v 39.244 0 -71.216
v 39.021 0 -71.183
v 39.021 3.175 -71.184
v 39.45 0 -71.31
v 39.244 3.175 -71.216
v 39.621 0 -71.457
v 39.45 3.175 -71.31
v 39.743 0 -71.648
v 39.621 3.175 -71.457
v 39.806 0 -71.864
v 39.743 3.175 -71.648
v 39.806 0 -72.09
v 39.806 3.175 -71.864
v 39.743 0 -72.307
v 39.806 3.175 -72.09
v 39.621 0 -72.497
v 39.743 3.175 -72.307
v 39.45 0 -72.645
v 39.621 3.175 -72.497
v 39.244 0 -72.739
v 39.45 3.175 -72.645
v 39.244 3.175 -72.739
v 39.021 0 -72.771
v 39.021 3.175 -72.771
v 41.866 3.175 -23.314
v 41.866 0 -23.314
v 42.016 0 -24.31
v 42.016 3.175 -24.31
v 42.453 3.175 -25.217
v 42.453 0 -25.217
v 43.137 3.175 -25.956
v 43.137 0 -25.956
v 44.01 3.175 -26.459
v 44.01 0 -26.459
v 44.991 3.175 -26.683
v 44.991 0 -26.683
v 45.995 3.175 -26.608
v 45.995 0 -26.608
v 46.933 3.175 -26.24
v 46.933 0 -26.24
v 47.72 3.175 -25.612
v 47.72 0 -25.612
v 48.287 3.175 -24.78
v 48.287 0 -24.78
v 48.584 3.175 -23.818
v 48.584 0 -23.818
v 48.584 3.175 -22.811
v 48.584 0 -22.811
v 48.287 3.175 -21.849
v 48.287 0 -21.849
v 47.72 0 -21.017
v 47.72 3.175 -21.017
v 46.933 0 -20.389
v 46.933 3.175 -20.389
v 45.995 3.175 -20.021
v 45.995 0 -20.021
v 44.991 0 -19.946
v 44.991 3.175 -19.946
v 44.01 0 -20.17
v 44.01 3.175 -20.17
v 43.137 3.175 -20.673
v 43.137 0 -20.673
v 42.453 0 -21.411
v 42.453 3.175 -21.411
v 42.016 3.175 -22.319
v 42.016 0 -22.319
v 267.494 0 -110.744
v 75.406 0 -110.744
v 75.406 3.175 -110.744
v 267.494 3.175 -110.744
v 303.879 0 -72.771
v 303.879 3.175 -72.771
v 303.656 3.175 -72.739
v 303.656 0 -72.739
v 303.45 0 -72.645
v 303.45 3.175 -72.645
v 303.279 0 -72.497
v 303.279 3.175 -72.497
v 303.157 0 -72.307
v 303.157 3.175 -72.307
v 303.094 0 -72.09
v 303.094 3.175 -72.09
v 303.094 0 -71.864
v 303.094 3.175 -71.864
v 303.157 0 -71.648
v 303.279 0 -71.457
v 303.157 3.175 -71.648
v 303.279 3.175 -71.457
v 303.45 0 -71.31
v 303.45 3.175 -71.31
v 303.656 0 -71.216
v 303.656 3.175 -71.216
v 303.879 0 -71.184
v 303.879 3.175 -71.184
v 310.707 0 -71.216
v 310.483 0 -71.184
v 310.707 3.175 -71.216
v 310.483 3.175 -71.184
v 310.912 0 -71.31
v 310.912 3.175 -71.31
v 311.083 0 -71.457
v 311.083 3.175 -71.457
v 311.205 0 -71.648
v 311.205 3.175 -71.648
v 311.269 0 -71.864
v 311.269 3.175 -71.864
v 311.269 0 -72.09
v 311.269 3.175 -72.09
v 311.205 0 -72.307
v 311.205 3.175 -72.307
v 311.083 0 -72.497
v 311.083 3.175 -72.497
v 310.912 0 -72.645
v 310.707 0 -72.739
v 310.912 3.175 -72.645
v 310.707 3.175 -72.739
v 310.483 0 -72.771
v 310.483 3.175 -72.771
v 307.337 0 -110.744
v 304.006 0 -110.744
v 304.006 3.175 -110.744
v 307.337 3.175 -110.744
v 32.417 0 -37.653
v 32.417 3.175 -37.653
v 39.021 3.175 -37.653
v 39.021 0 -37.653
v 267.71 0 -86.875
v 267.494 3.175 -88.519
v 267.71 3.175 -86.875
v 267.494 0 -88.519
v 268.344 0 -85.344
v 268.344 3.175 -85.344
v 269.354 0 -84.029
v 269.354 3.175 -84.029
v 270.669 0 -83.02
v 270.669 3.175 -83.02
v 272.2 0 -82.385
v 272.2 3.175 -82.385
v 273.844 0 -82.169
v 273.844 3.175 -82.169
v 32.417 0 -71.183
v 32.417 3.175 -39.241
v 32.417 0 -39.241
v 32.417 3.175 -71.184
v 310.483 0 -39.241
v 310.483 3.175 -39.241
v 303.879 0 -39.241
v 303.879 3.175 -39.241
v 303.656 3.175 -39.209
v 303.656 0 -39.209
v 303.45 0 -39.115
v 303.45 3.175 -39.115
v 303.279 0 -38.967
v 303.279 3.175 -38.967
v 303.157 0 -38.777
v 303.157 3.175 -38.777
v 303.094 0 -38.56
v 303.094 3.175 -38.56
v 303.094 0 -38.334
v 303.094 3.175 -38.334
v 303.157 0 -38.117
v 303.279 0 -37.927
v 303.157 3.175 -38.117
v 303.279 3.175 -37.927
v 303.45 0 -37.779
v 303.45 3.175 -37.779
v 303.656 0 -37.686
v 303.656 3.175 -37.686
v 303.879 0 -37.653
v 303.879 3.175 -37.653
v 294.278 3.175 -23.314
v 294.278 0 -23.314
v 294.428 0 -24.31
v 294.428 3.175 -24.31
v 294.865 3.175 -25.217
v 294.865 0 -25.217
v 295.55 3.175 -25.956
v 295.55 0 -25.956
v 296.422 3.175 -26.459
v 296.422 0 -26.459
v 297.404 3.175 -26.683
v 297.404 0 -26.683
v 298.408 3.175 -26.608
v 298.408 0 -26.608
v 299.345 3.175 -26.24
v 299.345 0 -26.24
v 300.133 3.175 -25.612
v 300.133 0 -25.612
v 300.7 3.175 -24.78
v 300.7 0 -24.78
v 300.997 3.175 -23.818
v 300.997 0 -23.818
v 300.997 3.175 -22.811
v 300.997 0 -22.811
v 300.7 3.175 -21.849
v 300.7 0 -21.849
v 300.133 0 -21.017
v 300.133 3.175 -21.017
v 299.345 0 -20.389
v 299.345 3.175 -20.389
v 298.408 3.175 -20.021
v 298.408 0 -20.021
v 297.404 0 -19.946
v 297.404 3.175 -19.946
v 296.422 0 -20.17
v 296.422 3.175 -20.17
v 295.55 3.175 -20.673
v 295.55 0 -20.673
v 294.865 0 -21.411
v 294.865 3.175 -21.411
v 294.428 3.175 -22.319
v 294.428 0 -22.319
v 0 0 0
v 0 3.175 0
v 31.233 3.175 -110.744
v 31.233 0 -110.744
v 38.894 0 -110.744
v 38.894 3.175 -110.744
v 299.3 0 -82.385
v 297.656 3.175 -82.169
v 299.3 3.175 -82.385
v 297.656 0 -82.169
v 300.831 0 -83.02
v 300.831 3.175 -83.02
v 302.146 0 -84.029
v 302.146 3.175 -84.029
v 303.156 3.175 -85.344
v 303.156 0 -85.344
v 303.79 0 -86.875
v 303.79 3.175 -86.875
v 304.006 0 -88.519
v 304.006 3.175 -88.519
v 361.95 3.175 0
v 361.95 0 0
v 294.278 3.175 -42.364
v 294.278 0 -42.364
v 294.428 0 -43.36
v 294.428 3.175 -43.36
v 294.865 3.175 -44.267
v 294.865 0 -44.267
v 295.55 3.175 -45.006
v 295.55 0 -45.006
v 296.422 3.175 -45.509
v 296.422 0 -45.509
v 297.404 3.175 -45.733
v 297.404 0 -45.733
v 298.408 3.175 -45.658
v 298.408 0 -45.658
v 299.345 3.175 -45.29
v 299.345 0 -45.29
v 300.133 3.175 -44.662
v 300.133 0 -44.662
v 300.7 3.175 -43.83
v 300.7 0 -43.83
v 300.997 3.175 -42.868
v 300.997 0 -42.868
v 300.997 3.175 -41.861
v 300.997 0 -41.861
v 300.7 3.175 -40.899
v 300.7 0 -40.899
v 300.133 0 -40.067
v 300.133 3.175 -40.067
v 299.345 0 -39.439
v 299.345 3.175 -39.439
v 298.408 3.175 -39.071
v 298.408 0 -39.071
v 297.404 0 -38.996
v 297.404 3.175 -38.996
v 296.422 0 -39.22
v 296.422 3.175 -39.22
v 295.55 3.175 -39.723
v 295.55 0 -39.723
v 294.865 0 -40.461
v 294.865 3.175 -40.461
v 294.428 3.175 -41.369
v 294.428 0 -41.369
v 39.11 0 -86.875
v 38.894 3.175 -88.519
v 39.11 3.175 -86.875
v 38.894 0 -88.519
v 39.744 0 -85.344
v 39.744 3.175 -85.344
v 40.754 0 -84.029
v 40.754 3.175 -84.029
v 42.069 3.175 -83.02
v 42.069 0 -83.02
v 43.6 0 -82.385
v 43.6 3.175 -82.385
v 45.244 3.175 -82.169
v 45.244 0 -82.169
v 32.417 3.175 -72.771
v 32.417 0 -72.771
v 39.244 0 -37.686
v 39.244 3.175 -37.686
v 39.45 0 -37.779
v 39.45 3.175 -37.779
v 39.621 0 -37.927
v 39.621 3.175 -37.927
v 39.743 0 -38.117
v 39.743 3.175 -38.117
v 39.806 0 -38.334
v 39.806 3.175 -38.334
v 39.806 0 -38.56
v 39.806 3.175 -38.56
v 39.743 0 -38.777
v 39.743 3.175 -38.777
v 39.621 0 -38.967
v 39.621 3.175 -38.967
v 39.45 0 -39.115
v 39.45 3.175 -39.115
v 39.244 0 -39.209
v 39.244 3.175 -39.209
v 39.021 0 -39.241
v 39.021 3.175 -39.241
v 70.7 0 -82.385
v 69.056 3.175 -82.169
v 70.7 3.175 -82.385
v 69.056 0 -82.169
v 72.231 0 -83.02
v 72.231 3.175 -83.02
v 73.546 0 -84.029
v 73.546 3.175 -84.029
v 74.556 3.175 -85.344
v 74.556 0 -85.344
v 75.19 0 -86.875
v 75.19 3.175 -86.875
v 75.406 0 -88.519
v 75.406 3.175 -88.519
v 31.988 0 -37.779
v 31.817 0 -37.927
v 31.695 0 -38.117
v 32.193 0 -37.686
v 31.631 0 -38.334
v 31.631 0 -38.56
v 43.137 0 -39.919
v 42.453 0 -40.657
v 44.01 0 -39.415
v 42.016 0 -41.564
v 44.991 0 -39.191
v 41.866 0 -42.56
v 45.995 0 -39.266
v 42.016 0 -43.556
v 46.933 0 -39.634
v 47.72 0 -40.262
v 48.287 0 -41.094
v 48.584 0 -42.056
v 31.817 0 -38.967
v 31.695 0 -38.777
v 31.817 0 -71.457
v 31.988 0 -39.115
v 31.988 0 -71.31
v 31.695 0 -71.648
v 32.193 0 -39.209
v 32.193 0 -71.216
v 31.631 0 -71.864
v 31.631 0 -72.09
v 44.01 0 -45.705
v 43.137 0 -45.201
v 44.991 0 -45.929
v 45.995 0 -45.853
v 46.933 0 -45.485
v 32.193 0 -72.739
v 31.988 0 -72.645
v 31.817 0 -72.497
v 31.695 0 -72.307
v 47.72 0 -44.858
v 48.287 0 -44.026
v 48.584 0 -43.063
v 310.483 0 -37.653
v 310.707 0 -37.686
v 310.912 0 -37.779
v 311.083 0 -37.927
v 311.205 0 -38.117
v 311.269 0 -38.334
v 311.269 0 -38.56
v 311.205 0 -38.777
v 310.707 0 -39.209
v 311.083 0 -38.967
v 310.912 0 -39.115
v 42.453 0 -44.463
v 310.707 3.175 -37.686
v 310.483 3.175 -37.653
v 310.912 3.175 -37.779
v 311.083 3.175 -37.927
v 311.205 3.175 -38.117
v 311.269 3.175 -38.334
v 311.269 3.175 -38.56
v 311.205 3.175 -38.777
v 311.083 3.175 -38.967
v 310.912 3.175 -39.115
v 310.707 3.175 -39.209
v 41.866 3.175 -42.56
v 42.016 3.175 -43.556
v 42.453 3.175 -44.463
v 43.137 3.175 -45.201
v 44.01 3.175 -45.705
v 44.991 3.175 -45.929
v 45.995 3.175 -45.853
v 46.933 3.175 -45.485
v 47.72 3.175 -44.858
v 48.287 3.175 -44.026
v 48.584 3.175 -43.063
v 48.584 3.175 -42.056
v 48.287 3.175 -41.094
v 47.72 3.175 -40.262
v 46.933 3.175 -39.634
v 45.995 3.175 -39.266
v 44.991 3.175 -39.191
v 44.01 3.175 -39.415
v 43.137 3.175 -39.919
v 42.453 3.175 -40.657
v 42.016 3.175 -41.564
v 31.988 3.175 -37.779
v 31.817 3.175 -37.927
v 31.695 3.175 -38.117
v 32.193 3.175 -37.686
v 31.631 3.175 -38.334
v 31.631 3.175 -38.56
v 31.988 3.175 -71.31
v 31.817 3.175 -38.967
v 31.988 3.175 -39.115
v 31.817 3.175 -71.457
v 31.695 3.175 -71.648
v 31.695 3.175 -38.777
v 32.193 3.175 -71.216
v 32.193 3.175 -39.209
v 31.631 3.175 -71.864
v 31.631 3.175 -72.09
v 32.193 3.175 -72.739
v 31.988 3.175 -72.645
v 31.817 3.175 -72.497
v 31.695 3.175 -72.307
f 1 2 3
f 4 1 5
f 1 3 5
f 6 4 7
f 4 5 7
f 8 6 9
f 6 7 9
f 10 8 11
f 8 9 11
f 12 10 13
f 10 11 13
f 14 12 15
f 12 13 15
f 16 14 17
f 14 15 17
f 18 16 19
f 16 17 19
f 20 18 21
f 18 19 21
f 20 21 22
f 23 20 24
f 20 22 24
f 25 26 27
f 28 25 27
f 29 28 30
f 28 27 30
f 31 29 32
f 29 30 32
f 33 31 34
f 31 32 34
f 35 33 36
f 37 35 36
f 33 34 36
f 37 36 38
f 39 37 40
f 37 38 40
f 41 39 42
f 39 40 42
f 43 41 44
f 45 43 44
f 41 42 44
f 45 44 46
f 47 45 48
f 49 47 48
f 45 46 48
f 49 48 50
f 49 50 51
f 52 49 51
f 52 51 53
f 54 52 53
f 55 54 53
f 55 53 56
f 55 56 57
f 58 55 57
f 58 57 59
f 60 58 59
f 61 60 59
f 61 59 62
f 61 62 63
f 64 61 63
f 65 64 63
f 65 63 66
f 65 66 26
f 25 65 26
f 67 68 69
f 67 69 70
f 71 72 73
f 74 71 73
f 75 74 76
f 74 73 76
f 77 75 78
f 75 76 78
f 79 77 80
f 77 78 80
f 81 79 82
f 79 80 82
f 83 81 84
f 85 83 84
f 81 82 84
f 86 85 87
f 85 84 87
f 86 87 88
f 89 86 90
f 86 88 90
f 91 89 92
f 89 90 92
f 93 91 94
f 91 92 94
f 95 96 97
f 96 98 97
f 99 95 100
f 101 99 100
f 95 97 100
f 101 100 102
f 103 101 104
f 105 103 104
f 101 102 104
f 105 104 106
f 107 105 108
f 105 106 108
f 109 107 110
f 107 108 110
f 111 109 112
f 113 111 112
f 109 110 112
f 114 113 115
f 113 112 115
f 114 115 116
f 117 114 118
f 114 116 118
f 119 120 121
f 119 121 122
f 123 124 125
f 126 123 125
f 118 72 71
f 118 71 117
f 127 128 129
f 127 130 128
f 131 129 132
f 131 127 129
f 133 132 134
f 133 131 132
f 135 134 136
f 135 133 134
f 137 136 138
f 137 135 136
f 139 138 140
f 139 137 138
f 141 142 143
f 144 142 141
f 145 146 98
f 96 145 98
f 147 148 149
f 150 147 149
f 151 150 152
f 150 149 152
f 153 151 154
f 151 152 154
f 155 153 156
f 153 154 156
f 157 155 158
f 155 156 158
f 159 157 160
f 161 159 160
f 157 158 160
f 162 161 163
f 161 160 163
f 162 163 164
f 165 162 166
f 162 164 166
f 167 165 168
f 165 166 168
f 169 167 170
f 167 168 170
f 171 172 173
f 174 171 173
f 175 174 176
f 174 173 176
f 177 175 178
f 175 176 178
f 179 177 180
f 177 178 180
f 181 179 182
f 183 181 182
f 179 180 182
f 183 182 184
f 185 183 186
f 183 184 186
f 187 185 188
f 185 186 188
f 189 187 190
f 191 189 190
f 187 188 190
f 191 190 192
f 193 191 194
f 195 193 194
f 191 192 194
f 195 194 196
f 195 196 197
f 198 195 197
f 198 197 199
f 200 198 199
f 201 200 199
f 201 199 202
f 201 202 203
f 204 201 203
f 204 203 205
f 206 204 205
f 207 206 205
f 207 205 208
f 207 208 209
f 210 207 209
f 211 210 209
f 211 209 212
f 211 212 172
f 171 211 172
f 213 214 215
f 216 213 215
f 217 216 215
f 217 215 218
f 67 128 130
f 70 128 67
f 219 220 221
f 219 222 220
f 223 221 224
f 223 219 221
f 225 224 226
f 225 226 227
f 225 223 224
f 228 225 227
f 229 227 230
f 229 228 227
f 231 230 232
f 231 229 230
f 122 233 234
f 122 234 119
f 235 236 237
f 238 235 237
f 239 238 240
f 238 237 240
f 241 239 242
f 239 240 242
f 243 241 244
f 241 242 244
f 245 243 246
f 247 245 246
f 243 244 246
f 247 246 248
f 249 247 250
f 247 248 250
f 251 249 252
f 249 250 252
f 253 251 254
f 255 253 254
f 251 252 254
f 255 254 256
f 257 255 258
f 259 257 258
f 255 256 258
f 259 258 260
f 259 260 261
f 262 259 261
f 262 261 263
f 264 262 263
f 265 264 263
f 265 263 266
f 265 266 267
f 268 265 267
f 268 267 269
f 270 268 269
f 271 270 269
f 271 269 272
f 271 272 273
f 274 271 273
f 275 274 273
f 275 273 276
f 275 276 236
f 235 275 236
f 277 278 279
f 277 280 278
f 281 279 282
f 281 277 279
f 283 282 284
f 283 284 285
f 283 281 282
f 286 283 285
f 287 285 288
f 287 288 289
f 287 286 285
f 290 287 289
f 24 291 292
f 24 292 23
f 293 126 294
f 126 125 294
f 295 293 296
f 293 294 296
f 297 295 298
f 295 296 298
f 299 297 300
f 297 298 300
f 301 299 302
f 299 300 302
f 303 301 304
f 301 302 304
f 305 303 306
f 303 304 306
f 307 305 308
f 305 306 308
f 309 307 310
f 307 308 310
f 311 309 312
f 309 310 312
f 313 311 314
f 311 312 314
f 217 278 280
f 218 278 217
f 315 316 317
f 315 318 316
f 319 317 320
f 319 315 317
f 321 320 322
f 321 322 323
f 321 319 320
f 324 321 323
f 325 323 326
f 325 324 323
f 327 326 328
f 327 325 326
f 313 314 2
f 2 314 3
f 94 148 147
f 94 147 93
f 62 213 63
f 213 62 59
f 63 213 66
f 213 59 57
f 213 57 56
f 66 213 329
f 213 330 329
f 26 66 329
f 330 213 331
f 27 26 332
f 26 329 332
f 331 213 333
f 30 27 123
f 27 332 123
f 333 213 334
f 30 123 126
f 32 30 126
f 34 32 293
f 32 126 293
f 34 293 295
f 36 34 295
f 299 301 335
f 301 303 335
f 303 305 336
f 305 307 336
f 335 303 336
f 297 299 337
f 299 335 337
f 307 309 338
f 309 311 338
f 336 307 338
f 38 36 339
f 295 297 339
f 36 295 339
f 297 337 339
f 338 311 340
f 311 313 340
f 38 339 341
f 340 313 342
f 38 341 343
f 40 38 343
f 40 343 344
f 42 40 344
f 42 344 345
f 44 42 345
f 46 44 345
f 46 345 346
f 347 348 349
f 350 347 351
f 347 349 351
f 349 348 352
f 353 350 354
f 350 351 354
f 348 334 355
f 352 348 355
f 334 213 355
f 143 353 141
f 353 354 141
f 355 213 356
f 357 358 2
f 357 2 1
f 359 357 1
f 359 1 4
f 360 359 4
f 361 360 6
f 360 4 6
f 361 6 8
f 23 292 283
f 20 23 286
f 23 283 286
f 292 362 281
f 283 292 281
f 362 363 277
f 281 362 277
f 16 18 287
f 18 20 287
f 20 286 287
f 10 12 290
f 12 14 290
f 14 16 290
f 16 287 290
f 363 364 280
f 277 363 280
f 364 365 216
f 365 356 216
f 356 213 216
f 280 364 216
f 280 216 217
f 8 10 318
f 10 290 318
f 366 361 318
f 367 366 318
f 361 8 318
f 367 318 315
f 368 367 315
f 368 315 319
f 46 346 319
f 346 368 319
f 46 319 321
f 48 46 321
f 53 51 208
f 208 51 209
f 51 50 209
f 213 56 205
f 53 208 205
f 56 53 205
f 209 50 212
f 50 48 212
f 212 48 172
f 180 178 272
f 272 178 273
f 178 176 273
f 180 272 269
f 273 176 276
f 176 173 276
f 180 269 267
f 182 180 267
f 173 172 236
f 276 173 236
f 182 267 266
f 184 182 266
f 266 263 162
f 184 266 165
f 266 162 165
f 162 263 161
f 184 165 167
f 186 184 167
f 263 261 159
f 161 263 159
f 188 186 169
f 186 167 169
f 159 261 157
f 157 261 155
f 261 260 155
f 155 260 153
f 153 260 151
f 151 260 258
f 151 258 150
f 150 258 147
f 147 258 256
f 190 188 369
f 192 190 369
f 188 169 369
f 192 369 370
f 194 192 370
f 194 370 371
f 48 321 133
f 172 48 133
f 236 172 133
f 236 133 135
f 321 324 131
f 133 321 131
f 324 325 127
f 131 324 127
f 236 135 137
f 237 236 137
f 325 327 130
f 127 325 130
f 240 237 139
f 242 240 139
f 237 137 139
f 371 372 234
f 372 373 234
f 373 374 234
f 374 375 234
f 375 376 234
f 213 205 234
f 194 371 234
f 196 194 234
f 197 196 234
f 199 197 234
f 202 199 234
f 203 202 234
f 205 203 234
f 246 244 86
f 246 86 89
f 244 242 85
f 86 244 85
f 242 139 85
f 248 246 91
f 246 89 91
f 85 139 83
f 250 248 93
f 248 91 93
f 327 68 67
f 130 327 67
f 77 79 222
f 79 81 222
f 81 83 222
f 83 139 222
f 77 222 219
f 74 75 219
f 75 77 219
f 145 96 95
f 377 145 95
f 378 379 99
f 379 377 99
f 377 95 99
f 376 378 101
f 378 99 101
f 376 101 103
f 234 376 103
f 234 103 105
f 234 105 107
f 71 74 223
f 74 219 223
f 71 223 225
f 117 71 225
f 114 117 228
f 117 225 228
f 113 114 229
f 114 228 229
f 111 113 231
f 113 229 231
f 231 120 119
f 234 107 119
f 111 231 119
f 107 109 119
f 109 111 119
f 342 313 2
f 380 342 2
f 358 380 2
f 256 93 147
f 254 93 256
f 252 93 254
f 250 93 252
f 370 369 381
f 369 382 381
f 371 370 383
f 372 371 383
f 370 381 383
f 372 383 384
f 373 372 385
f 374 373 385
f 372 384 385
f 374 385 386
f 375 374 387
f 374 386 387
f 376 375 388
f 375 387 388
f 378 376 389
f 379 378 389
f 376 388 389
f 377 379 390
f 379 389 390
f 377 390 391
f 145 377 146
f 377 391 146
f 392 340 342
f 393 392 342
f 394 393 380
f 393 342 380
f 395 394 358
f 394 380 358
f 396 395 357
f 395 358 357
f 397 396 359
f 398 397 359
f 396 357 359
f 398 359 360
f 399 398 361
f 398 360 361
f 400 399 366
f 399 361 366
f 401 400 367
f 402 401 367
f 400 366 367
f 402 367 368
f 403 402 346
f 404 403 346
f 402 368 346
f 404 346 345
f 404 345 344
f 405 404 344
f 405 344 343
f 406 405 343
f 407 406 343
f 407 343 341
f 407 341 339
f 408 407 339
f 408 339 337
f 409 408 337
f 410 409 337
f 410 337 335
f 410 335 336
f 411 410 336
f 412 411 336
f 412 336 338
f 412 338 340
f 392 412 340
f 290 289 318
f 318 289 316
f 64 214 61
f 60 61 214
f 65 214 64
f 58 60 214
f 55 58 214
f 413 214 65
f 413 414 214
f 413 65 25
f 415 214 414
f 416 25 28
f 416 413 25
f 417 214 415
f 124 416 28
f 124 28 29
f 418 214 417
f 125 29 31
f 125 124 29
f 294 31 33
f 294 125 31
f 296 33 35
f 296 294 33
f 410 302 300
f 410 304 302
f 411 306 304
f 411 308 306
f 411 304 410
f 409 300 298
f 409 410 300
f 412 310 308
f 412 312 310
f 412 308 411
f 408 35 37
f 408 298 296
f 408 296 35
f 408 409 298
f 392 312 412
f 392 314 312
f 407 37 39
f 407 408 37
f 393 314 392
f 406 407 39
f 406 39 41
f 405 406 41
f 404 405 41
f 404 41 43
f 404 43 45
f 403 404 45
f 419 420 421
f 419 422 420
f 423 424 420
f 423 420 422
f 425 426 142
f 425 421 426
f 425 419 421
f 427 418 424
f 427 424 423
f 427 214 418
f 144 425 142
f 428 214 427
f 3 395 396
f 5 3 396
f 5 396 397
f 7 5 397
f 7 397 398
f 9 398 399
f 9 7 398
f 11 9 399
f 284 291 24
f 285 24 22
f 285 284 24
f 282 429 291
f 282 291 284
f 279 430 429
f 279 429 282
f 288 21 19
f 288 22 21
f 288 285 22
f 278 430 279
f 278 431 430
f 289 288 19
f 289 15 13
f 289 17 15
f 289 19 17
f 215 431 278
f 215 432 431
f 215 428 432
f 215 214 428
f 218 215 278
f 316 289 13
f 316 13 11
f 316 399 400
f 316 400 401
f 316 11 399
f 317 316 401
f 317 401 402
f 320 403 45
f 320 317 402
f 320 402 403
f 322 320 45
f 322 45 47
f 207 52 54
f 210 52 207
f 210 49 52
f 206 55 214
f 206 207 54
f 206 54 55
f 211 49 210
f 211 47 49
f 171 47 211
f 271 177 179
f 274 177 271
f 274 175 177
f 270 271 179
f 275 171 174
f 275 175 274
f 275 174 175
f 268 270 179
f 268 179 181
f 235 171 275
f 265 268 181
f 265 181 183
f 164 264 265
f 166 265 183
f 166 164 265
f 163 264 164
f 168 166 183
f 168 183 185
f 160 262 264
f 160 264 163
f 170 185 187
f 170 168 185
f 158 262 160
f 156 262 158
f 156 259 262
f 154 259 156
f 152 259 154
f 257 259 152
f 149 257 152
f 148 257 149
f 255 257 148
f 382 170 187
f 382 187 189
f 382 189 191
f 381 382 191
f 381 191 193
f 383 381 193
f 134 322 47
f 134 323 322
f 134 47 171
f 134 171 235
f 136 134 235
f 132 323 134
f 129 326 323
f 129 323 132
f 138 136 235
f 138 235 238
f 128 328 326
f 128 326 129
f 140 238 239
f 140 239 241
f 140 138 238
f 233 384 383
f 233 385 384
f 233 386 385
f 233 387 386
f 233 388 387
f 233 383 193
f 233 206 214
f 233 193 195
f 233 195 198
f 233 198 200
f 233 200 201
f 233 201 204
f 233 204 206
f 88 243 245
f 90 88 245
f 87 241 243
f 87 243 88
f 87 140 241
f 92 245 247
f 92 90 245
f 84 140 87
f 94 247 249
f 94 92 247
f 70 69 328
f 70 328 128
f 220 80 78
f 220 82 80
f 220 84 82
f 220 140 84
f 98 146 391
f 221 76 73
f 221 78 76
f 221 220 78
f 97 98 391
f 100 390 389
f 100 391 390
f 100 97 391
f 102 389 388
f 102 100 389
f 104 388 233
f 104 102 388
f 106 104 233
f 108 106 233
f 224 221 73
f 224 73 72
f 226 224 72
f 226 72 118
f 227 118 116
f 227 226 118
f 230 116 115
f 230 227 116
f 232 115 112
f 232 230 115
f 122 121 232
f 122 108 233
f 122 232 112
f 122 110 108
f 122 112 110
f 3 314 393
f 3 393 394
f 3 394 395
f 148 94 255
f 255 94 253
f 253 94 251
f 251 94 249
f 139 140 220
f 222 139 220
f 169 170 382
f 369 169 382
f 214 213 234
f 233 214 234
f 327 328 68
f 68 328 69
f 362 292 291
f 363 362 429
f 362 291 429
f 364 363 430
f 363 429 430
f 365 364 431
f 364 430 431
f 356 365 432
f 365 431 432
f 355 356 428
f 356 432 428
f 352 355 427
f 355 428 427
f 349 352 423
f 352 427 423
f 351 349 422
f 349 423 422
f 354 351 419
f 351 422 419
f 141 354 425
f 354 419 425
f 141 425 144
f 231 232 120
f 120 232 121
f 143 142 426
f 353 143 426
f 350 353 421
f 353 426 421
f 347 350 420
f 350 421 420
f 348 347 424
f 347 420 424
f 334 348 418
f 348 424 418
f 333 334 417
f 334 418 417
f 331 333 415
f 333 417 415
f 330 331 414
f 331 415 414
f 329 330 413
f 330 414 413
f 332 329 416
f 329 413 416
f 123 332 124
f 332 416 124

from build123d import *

# Parameters (mm, degrees)
SKETCH1_W               = 361.95
SKETCH1_H               = 110.744
BOSS_EXTRUDE1_DEPTH     = 3.175
CUT_EXTRUDE1_DEPTH      = 4.175
SKETCH3_W               = 36.5125
SKETCH3_H               = 28.575
CUT_EXTRUDE2_DEPTH      = 4.175
FILLET1_R               = 6.35
F_1_4_CLEARANCE_HOLE1_D = 6.7564
SKETCH7_W               = 6.604
SKETCH7_H               = 35.117637185
CUT_EXTRUDE4_DEPTH      = 4.175
SKETCH8_R               = 0.79375
CUT_EXTRUDE5_DEPTH      = 4.175


with BuildPart() as part:
    # Sketch1 → Boss-Extrude1 (new body)
    with BuildSketch(Plane(origin=(0, 0, 0), x_dir=(1, 0, 0), z_dir=(0, 1, 0))):
        with Locations((180.975, 55.372)):
            Rectangle(SKETCH1_W, SKETCH1_H)
    extrude(amount=BOSS_EXTRUDE1_DEPTH)

    # Sketch2 → Cut-Extrude1 (cut, through all)
    with BuildSketch(Plane(origin=(0, 3.175, 0), x_dir=(1, 0, 0), z_dir=(0, 1, 0))):
        Polygon((0, 0), (31.233038214, 110.744), (0, 110.744), align=None)
        Polygon((361.95, 0), (307.33710294, 110.744), (361.95, 110.744), align=None)
    extrude(amount=-CUT_EXTRUDE1_DEPTH, mode=Mode.SUBTRACT)

    # Sketch3 → Cut-Extrude2 (cut, through all)
    with BuildSketch(Plane(origin=(0, 3.175, 0), x_dir=(1, 0, 0), z_dir=(0, 1, 0))):
        with Locations((57.15, 96.4565)):
            Rectangle(SKETCH3_W, SKETCH3_H)
        with Locations((285.75, 96.4565)):
            Rectangle(SKETCH3_W, SKETCH3_H)
    extrude(amount=-CUT_EXTRUDE2_DEPTH, mode=Mode.SUBTRACT)

    # Fillet1
    fillet1_edges = [part.edges().sort_by_distance(p)[0] for p in [
        (75.40625, 1.5875, -82.169),
        (38.89375, 1.5875, -82.169),
        (304.00625, 1.5875, -82.169),
        (267.49375, 1.5875, -82.169),
    ]]
    fillet(fillet1_edges, radius=FILLET1_R)

    # 1/4 Clearance Hole1 (through all)
    with Locations(Plane(origin=(0, 3.175, 0), x_dir=(1, 0, 0), z_dir=(0, 1, 0))):
        with Locations((297.65625, 42.364421689), (297.65625, 23.314421689), (45.24375, 23.314421689), (45.24375, 42.559885057)):
            Hole(F_1_4_CLEARANCE_HOLE1_D / 2)

    # Sketch7 → Cut-Extrude4 (cut, through all)
    with BuildSketch(Plane(origin=(0, 3.175, 0), x_dir=(1, 0, 0), z_dir=(0, 1, 0))):
        with Locations((307.18125, 55.212181407)):
            Rectangle(SKETCH7_W, SKETCH7_H)
        with Locations((35.71875, 55.212181407)):
            Rectangle(SKETCH7_W, SKETCH7_H)
    extrude(amount=-CUT_EXTRUDE4_DEPTH, mode=Mode.SUBTRACT)

    # Sketch8 → Cut-Extrude5 (cut, through all)
    with BuildSketch(Plane(origin=(0, 3.175, 0), x_dir=(1, 0, 0), z_dir=(0, 1, 0))):
        with Locations((39.02075, 38.447112815)):
            Circle(SKETCH8_R)
        with Locations((39.02075, 71.97725)):
            Circle(SKETCH8_R)
        with Locations((32.41675, 71.97725)):
            Circle(SKETCH8_R)
        with Locations((32.41675, 38.447112815)):
            Circle(SKETCH8_R)
        with Locations((303.87925, 71.97725)):
            Circle(SKETCH8_R)
        with Locations((310.48325, 71.97725)):
            Circle(SKETCH8_R)
        with Locations((310.48325, 38.447112815)):
            Circle(SKETCH8_R)
        with Locations((303.87925, 38.447112815)):
            Circle(SKETCH8_R)
    extrude(amount=-CUT_EXTRUDE5_DEPTH, mode=Mode.SUBTRACT)


solid = part.part
